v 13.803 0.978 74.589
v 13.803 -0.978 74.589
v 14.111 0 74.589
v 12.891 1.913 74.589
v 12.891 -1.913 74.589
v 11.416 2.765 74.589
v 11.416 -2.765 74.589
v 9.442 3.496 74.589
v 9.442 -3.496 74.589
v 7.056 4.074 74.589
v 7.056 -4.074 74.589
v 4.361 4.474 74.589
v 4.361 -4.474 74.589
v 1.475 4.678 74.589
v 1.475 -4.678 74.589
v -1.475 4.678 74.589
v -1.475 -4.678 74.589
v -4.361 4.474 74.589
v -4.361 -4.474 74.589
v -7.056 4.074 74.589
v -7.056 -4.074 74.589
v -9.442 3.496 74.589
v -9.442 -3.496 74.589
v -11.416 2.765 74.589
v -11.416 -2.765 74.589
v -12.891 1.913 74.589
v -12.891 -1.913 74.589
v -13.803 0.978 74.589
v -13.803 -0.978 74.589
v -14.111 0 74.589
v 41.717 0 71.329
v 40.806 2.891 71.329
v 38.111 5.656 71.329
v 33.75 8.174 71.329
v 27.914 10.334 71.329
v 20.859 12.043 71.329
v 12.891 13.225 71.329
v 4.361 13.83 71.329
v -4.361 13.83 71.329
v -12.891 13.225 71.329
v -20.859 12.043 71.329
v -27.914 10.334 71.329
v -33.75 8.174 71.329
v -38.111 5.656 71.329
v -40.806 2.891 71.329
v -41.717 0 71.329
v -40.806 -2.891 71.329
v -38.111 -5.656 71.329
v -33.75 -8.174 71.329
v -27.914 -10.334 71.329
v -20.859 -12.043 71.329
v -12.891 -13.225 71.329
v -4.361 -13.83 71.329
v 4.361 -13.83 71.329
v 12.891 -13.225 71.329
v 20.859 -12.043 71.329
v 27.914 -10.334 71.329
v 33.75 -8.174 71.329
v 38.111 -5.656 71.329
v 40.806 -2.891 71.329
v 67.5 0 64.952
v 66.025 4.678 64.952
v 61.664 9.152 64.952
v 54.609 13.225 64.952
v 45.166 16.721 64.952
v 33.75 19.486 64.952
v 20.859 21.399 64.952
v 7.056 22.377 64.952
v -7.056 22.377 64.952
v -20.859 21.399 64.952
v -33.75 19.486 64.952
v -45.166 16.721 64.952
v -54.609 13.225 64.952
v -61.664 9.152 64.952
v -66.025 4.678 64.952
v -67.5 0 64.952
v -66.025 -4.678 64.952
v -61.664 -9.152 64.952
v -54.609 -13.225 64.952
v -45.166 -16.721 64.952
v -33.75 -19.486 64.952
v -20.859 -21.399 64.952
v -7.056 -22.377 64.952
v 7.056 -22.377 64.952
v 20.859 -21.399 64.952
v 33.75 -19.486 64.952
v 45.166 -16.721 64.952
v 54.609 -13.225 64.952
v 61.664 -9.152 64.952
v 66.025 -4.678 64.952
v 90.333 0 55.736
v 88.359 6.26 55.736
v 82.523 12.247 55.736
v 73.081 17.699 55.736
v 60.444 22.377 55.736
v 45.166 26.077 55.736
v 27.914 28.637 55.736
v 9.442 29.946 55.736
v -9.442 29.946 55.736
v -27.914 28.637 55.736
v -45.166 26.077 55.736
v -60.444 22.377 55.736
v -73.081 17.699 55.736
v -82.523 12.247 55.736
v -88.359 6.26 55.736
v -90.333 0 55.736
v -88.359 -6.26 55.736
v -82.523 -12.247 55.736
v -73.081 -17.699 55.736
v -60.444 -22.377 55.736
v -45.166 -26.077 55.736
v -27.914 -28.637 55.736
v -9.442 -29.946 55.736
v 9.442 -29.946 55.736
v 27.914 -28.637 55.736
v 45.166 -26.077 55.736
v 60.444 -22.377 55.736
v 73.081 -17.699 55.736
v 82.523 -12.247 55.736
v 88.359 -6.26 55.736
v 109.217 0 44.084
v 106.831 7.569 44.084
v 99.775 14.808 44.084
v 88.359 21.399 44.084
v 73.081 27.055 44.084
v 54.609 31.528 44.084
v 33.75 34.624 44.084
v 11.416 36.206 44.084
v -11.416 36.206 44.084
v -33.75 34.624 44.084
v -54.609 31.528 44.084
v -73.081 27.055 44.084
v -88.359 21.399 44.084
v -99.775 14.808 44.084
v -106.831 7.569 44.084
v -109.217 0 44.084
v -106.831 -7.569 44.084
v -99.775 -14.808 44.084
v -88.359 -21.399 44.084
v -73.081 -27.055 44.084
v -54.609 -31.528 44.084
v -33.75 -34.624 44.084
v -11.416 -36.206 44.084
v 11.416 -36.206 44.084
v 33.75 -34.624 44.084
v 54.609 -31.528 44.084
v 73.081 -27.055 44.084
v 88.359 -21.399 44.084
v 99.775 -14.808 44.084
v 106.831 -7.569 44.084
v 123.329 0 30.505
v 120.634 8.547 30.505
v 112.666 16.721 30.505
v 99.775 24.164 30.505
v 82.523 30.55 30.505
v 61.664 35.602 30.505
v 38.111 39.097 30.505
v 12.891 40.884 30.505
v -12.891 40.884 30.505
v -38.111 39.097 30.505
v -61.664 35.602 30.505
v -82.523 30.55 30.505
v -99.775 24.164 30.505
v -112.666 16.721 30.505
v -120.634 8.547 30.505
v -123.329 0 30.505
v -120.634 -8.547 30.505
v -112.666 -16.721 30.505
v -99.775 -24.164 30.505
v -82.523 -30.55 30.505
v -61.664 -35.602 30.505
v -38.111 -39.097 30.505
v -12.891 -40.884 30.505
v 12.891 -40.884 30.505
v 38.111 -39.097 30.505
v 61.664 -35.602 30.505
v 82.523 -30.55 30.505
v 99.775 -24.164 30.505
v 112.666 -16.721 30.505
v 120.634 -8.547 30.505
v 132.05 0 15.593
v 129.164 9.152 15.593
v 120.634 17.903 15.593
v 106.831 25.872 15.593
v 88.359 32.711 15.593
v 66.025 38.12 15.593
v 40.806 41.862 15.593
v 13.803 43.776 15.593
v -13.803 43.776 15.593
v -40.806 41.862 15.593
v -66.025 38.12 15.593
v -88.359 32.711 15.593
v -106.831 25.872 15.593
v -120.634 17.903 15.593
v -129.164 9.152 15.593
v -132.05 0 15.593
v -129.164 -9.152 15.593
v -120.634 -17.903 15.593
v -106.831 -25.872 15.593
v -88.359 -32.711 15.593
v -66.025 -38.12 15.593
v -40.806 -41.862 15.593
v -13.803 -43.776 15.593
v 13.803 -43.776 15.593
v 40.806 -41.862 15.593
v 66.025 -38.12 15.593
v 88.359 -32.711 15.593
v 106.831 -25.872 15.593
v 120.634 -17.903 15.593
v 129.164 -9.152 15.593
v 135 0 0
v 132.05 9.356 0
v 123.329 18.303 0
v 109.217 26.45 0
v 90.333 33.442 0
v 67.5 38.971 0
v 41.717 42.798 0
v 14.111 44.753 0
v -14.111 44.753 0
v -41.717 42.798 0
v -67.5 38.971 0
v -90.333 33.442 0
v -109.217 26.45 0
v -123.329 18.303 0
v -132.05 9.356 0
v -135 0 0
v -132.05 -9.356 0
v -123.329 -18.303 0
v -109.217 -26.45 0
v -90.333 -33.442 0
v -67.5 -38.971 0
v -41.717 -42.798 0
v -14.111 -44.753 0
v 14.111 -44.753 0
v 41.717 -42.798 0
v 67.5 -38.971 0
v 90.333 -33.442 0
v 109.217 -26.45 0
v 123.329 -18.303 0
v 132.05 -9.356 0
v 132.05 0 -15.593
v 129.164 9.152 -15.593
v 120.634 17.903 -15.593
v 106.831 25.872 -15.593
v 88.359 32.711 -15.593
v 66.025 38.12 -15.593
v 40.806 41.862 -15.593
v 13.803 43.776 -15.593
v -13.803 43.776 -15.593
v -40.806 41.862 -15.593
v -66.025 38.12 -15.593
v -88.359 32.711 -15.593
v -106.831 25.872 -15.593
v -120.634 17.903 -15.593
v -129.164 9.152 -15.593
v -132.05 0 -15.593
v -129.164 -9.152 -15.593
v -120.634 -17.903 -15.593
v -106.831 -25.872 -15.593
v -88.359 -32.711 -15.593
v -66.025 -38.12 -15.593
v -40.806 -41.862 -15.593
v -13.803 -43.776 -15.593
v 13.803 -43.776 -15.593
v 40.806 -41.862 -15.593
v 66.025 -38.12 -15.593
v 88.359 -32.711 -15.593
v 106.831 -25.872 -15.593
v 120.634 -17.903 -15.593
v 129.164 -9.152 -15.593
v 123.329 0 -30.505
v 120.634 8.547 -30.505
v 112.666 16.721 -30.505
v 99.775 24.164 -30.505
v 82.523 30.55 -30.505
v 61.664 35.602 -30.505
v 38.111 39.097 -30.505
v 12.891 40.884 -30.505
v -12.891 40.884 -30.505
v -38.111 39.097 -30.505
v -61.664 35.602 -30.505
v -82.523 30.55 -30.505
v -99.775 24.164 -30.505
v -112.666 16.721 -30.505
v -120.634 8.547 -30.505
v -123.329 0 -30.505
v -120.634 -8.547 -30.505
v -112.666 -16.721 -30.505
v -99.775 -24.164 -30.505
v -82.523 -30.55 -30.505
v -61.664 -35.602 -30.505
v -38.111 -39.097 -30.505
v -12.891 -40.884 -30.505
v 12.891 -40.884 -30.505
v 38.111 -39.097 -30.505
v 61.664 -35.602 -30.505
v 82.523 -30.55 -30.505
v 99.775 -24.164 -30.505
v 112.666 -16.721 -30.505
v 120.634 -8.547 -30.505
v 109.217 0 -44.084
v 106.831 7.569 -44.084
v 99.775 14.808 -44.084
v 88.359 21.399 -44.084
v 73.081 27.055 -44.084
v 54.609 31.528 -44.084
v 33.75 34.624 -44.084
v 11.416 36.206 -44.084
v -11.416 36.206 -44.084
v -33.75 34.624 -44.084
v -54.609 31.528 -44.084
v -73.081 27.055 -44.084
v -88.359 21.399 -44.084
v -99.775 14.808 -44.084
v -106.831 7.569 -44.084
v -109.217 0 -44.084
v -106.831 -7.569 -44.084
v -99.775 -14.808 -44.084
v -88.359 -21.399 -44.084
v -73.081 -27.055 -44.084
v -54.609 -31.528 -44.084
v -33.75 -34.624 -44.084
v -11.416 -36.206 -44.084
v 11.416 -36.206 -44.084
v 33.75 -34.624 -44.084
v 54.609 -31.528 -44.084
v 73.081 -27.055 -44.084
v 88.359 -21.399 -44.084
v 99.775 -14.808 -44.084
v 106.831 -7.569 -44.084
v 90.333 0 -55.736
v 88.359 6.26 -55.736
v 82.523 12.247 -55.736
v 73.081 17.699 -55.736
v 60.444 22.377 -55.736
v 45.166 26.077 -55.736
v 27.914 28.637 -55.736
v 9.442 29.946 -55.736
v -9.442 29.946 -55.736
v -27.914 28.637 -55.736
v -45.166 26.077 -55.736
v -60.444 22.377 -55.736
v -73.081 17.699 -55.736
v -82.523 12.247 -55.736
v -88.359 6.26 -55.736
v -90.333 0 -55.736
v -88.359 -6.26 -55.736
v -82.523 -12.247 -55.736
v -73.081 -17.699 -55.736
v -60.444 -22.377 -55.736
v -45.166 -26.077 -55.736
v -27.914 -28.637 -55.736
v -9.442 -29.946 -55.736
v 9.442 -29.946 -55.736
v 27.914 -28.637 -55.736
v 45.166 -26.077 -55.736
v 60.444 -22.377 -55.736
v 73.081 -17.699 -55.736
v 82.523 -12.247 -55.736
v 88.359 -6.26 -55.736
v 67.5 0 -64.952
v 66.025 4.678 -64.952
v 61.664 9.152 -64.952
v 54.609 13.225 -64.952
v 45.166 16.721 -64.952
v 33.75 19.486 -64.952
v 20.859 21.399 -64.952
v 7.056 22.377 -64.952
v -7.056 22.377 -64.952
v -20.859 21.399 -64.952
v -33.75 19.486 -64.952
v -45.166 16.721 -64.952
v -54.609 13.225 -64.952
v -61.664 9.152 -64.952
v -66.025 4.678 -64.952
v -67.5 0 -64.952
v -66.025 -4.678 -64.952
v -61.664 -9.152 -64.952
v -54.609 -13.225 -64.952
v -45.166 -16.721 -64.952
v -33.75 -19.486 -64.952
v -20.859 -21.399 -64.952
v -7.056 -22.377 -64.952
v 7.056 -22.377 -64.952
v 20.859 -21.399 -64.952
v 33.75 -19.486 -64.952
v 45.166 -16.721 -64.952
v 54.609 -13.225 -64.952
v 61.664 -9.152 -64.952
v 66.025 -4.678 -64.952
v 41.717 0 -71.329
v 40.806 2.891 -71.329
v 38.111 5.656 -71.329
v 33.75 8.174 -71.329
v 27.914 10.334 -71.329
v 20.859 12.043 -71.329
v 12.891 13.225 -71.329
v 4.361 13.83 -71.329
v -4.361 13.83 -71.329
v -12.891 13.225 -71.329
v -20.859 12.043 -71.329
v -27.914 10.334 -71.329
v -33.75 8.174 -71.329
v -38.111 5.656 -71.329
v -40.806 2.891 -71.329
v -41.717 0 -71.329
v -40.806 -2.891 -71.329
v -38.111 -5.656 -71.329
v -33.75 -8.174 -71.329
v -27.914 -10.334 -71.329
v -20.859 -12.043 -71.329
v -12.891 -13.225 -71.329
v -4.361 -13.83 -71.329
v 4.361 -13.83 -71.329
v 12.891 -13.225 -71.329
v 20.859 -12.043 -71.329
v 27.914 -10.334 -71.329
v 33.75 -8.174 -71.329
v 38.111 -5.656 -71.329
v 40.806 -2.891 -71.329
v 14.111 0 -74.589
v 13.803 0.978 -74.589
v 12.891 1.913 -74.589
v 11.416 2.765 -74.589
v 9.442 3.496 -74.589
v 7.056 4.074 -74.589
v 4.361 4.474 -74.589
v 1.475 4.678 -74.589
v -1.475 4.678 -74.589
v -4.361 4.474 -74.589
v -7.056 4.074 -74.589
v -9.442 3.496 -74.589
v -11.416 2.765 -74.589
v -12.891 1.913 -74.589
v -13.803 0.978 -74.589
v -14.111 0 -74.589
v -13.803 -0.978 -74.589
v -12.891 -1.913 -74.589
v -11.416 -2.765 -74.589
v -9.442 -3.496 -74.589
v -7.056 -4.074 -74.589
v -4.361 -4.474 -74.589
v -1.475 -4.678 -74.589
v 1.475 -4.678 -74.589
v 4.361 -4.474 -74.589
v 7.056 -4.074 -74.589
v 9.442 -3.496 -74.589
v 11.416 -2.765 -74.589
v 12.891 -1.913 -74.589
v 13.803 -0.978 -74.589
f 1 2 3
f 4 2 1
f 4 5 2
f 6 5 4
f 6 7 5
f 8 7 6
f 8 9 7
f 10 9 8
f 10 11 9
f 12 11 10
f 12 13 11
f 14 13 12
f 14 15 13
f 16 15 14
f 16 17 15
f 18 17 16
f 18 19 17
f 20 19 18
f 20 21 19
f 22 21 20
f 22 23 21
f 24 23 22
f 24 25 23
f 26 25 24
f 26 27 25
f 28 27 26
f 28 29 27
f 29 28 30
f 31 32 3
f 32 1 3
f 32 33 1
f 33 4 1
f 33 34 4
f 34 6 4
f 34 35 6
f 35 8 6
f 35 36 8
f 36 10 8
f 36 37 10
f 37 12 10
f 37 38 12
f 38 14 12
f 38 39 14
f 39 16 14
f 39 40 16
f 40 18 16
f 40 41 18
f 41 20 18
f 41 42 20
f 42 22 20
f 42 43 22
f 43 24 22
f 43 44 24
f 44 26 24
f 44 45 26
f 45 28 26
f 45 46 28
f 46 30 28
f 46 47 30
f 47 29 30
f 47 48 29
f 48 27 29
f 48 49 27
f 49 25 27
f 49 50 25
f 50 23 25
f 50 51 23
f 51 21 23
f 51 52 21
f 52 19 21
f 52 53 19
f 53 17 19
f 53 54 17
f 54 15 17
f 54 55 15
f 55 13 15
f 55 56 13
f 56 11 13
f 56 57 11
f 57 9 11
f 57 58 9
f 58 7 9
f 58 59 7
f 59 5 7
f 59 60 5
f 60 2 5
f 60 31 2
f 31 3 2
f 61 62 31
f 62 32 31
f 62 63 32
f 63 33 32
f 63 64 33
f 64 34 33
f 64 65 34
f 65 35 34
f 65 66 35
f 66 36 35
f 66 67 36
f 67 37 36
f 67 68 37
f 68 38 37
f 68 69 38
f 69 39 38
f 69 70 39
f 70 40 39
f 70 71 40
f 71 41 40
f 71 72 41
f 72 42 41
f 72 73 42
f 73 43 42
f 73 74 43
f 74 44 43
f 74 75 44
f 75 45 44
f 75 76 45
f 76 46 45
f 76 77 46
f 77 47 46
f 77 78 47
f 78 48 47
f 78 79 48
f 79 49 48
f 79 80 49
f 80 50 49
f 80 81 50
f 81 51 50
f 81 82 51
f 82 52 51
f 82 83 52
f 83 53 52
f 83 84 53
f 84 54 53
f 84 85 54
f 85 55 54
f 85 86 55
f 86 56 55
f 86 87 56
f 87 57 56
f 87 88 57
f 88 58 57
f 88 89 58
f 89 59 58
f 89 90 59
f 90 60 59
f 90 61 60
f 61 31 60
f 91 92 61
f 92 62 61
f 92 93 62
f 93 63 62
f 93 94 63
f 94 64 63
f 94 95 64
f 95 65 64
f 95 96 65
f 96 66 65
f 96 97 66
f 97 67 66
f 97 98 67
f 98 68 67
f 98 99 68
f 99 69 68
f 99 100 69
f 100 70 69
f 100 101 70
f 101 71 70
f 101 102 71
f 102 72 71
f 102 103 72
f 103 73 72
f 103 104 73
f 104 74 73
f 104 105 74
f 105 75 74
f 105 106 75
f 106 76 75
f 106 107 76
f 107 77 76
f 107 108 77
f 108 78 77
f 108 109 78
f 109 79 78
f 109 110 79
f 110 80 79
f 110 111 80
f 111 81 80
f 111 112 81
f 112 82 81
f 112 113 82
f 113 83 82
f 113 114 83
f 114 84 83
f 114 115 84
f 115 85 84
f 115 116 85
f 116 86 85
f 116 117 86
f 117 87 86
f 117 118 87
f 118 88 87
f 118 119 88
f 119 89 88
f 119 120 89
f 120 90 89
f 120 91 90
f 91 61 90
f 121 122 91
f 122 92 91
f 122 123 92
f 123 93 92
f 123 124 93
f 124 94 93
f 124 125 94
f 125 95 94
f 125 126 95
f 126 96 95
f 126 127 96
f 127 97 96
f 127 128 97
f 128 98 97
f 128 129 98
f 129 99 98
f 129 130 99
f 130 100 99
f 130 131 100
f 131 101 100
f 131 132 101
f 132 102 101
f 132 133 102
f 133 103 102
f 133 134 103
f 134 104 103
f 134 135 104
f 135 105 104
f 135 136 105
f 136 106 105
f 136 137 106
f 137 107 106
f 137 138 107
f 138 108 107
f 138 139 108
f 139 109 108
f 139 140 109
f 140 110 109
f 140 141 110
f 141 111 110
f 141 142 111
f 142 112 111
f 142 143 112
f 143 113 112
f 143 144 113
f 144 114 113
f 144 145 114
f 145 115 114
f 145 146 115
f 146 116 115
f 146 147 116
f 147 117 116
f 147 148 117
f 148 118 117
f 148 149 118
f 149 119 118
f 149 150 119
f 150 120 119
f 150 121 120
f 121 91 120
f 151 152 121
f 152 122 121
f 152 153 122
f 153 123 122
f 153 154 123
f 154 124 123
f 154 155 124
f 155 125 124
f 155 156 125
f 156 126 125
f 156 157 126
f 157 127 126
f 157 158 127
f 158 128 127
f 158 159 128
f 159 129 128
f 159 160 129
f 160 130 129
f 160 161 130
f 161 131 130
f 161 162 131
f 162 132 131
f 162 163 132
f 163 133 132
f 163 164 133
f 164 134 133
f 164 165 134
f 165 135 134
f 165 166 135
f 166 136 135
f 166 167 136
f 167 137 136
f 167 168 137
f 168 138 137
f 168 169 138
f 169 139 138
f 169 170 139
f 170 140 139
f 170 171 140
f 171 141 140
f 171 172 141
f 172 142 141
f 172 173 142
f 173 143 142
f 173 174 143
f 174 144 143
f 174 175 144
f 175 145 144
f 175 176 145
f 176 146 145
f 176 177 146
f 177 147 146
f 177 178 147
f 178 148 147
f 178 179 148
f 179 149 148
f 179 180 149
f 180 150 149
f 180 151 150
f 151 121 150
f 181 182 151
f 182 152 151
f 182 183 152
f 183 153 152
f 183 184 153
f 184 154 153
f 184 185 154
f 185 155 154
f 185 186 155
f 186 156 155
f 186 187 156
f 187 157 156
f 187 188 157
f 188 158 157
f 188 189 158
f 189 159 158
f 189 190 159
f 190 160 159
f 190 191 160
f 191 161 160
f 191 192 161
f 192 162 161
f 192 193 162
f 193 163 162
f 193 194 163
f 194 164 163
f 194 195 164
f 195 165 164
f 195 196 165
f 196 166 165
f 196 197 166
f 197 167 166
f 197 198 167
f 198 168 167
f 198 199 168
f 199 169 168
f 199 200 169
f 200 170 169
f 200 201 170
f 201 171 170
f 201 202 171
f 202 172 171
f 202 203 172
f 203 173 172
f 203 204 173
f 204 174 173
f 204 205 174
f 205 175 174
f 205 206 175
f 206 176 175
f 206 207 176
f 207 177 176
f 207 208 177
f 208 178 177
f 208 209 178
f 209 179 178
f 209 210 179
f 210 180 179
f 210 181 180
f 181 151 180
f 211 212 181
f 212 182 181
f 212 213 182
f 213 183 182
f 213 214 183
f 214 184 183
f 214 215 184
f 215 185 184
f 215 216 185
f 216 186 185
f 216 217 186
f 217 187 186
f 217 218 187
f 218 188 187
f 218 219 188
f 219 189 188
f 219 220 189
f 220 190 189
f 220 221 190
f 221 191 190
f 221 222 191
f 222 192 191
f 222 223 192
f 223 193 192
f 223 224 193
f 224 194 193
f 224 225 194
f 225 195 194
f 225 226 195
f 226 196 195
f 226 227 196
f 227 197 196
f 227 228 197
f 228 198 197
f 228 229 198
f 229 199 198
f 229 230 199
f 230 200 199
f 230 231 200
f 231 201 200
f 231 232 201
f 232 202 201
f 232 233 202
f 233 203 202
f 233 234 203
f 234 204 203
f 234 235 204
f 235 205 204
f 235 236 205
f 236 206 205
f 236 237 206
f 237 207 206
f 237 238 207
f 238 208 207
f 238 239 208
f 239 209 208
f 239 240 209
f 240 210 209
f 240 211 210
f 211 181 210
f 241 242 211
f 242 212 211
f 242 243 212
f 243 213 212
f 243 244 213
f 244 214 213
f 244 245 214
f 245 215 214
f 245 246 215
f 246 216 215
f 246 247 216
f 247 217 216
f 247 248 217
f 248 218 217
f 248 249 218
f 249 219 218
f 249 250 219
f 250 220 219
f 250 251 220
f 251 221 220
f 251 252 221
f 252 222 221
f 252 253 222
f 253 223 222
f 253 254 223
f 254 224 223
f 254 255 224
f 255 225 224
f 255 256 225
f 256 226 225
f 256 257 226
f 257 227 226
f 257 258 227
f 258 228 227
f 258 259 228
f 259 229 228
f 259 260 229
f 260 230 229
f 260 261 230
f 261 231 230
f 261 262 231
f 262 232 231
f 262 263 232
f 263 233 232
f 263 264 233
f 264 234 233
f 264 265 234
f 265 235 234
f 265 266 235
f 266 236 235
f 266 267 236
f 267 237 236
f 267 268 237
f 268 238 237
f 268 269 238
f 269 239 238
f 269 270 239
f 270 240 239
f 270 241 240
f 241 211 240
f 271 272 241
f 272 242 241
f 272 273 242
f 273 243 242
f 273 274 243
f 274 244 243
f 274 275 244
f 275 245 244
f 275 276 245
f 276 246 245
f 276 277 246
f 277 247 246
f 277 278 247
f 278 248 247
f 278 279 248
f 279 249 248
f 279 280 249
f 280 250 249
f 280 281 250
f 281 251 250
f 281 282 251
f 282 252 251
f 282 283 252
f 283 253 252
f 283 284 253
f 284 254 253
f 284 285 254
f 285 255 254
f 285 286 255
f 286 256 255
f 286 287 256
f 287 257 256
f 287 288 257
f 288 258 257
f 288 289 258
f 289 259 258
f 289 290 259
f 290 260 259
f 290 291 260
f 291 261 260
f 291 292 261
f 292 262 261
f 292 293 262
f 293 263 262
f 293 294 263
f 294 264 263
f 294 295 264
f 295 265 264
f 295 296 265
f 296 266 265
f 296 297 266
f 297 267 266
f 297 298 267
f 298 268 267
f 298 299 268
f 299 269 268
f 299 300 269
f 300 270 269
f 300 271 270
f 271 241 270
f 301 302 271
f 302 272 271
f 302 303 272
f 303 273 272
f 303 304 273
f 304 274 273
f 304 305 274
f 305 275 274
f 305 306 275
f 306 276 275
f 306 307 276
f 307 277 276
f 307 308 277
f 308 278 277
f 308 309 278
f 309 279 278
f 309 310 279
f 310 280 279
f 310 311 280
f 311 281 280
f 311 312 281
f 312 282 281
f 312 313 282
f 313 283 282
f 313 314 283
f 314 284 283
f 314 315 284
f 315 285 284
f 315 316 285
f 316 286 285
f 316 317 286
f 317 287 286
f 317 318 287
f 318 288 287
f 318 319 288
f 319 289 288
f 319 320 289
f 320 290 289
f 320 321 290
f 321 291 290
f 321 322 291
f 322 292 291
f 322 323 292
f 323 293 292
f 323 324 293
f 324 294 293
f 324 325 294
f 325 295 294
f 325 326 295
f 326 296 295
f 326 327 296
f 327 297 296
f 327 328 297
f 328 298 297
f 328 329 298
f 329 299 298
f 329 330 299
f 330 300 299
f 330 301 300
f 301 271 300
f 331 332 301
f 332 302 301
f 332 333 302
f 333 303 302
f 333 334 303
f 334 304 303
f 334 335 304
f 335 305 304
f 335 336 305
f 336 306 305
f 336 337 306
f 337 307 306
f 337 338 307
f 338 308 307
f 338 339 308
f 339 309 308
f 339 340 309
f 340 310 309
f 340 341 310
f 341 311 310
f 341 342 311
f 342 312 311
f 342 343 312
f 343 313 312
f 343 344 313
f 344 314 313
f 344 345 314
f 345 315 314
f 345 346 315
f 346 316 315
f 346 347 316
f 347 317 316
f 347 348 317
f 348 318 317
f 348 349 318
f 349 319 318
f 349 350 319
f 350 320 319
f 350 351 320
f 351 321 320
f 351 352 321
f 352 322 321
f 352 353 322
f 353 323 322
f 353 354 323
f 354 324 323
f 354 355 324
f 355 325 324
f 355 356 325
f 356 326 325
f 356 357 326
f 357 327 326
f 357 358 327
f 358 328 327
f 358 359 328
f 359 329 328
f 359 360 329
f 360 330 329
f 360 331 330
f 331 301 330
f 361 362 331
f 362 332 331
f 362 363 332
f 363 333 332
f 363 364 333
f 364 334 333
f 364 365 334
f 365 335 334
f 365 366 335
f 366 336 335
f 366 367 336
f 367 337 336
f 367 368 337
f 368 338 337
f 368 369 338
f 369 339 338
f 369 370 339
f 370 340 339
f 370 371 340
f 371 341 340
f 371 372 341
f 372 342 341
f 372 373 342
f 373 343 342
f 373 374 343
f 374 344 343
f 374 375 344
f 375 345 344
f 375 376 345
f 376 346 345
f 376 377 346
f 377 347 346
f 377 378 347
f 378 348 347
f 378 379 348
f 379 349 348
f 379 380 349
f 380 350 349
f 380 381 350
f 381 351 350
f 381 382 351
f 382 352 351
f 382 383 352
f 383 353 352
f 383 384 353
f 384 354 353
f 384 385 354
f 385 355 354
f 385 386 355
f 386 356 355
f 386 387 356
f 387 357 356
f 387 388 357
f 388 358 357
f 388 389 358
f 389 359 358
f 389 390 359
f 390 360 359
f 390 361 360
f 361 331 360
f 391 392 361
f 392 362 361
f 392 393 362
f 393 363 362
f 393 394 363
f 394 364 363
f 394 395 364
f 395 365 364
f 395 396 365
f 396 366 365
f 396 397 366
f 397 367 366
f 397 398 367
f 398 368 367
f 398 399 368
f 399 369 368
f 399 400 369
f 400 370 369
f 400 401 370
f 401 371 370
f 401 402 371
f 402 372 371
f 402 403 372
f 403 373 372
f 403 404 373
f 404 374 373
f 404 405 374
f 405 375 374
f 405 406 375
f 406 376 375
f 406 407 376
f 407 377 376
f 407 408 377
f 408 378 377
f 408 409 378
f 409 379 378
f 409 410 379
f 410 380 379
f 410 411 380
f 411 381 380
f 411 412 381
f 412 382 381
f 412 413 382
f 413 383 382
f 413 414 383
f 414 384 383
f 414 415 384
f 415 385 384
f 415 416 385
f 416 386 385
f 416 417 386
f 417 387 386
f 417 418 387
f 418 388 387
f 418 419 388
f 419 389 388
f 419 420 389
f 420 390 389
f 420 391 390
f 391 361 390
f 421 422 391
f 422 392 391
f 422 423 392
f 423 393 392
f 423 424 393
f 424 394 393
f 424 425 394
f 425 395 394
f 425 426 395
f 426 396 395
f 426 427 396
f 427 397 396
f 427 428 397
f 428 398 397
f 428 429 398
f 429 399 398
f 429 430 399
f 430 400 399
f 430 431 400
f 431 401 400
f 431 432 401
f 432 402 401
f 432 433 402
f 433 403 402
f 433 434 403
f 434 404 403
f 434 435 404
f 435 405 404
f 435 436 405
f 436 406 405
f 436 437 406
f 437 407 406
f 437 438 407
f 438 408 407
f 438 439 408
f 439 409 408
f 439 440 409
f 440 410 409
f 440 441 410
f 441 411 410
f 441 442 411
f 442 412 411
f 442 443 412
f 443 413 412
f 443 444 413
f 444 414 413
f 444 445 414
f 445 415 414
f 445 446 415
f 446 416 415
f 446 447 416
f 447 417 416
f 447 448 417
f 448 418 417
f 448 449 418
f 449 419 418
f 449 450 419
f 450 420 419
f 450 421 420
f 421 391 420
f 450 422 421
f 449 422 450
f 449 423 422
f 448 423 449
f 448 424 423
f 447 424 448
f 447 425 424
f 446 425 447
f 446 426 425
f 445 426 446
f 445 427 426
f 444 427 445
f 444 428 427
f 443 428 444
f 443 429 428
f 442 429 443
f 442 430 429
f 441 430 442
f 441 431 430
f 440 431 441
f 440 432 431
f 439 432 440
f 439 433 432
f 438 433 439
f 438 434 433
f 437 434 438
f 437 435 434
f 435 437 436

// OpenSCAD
// Generated by SolidPython 1.0.1 on 2020-07-29 00:46:48


scale(v = [9, 3, 5]) {
	sphere(r = 15);
}
/***********************************************
*********      SolidPython code:      **********
************************************************
 
# import packages: SolidPython
from solid import *
from solid.utils import *
from itertools import chain, combinations, permutations


class Resize:

    def __init__(self, scad_file):
        self.scad_file = scad_file
        #self.scad_file = import_scad(scad_file)
        # cone/cylinder param:
        self.r1 = 0
        self.r2 = 0
        self.h = 0
        # rectangular prism param:
        self.w = 0
        self.l = 0
        # ellipse param:
        self.r = 0

    # import OpenScad code (file name corresponds to shape)


    # classify shape + parameters
    def assign(self, param1, param2, param3):
        if self.scad_file == 'cone.scad':
            self.r1 = param1
            self.r2 = param2
            self.h = param3
        elif self.scad_file == 'cylinder.scad':
            self.r1 = param1
            self.r2 = param2
            self.h = param3
        elif self.scad_file == 'rectangularPrism.scad':
            self.h = param1
            self.l = param2
            self.w = param3
        else:
            self.r = param1
            self.h = param2

    # resize parameters
    def iterate(self):
        x = range(3, 20, 2)
        i = 1
        if self.scad_file == 'cone.scad':
            tempList = list(permutations(x, 2))
            for temp in tempList:
                param1 = temp[0]
                param2 = temp[1]
                filepath = 'produced_scad_files/' + 'cone' + str(param1) + '_' + str(param2) + '_' + '.scad'
                scad_render_to_file(cylinder(h=param1, r1=param2, r2=0), filepath)

        elif self.scad_file == 'cylinder.scad':
            tempList = list(permutations(x, 3))
            for temp in tempList:
                param1 = temp[0]
                param2 = temp[1]
                filepath = 'produced_scad_files/' + 'cylinder' + str(param1) + '_' + str(param2) + '_' + '.scad'
                scad_render_to_file(cylinder(h=param1, r1=param2, r2=param2), filepath)

        elif self.scad_file == 'rectangularPrism.scad':
            tempList = list(permutations(x, 3))
            for temp in tempList:
                param1 = temp[0]
                param2 = temp[1]
                param3 = temp[2]
                filepath = 'produced_scad_files/' + 'rectangularPrism' + str(param1) + '_' + str(param2) + '_' + str(
                    param3) + '.scad'
                scad_render_to_file(cube(size=(param1, param2, param3)), filepath)

        elif self.scad_file == 'ellipse.scad':
            tempList = list(permutations(x, 4))
            for temp in tempList:
                param1 = temp[0]
                param2 = temp[1]
                param3 = temp[2]
                param4 = temp[3]
                filepath = 'produced_scad_files/' + 'ellipse' + str(param1) + '_' + str(param2) + '_' + str(param3) + '_' + str(param4) + '.scad'
                scad_render_to_file(scale([param1, param2, param3])(sphere(r=param4)), filepath)

    def render_to_scadfile(self):
        scad_render_to_file(scad, 'example.scad') 
 
************************************************/
